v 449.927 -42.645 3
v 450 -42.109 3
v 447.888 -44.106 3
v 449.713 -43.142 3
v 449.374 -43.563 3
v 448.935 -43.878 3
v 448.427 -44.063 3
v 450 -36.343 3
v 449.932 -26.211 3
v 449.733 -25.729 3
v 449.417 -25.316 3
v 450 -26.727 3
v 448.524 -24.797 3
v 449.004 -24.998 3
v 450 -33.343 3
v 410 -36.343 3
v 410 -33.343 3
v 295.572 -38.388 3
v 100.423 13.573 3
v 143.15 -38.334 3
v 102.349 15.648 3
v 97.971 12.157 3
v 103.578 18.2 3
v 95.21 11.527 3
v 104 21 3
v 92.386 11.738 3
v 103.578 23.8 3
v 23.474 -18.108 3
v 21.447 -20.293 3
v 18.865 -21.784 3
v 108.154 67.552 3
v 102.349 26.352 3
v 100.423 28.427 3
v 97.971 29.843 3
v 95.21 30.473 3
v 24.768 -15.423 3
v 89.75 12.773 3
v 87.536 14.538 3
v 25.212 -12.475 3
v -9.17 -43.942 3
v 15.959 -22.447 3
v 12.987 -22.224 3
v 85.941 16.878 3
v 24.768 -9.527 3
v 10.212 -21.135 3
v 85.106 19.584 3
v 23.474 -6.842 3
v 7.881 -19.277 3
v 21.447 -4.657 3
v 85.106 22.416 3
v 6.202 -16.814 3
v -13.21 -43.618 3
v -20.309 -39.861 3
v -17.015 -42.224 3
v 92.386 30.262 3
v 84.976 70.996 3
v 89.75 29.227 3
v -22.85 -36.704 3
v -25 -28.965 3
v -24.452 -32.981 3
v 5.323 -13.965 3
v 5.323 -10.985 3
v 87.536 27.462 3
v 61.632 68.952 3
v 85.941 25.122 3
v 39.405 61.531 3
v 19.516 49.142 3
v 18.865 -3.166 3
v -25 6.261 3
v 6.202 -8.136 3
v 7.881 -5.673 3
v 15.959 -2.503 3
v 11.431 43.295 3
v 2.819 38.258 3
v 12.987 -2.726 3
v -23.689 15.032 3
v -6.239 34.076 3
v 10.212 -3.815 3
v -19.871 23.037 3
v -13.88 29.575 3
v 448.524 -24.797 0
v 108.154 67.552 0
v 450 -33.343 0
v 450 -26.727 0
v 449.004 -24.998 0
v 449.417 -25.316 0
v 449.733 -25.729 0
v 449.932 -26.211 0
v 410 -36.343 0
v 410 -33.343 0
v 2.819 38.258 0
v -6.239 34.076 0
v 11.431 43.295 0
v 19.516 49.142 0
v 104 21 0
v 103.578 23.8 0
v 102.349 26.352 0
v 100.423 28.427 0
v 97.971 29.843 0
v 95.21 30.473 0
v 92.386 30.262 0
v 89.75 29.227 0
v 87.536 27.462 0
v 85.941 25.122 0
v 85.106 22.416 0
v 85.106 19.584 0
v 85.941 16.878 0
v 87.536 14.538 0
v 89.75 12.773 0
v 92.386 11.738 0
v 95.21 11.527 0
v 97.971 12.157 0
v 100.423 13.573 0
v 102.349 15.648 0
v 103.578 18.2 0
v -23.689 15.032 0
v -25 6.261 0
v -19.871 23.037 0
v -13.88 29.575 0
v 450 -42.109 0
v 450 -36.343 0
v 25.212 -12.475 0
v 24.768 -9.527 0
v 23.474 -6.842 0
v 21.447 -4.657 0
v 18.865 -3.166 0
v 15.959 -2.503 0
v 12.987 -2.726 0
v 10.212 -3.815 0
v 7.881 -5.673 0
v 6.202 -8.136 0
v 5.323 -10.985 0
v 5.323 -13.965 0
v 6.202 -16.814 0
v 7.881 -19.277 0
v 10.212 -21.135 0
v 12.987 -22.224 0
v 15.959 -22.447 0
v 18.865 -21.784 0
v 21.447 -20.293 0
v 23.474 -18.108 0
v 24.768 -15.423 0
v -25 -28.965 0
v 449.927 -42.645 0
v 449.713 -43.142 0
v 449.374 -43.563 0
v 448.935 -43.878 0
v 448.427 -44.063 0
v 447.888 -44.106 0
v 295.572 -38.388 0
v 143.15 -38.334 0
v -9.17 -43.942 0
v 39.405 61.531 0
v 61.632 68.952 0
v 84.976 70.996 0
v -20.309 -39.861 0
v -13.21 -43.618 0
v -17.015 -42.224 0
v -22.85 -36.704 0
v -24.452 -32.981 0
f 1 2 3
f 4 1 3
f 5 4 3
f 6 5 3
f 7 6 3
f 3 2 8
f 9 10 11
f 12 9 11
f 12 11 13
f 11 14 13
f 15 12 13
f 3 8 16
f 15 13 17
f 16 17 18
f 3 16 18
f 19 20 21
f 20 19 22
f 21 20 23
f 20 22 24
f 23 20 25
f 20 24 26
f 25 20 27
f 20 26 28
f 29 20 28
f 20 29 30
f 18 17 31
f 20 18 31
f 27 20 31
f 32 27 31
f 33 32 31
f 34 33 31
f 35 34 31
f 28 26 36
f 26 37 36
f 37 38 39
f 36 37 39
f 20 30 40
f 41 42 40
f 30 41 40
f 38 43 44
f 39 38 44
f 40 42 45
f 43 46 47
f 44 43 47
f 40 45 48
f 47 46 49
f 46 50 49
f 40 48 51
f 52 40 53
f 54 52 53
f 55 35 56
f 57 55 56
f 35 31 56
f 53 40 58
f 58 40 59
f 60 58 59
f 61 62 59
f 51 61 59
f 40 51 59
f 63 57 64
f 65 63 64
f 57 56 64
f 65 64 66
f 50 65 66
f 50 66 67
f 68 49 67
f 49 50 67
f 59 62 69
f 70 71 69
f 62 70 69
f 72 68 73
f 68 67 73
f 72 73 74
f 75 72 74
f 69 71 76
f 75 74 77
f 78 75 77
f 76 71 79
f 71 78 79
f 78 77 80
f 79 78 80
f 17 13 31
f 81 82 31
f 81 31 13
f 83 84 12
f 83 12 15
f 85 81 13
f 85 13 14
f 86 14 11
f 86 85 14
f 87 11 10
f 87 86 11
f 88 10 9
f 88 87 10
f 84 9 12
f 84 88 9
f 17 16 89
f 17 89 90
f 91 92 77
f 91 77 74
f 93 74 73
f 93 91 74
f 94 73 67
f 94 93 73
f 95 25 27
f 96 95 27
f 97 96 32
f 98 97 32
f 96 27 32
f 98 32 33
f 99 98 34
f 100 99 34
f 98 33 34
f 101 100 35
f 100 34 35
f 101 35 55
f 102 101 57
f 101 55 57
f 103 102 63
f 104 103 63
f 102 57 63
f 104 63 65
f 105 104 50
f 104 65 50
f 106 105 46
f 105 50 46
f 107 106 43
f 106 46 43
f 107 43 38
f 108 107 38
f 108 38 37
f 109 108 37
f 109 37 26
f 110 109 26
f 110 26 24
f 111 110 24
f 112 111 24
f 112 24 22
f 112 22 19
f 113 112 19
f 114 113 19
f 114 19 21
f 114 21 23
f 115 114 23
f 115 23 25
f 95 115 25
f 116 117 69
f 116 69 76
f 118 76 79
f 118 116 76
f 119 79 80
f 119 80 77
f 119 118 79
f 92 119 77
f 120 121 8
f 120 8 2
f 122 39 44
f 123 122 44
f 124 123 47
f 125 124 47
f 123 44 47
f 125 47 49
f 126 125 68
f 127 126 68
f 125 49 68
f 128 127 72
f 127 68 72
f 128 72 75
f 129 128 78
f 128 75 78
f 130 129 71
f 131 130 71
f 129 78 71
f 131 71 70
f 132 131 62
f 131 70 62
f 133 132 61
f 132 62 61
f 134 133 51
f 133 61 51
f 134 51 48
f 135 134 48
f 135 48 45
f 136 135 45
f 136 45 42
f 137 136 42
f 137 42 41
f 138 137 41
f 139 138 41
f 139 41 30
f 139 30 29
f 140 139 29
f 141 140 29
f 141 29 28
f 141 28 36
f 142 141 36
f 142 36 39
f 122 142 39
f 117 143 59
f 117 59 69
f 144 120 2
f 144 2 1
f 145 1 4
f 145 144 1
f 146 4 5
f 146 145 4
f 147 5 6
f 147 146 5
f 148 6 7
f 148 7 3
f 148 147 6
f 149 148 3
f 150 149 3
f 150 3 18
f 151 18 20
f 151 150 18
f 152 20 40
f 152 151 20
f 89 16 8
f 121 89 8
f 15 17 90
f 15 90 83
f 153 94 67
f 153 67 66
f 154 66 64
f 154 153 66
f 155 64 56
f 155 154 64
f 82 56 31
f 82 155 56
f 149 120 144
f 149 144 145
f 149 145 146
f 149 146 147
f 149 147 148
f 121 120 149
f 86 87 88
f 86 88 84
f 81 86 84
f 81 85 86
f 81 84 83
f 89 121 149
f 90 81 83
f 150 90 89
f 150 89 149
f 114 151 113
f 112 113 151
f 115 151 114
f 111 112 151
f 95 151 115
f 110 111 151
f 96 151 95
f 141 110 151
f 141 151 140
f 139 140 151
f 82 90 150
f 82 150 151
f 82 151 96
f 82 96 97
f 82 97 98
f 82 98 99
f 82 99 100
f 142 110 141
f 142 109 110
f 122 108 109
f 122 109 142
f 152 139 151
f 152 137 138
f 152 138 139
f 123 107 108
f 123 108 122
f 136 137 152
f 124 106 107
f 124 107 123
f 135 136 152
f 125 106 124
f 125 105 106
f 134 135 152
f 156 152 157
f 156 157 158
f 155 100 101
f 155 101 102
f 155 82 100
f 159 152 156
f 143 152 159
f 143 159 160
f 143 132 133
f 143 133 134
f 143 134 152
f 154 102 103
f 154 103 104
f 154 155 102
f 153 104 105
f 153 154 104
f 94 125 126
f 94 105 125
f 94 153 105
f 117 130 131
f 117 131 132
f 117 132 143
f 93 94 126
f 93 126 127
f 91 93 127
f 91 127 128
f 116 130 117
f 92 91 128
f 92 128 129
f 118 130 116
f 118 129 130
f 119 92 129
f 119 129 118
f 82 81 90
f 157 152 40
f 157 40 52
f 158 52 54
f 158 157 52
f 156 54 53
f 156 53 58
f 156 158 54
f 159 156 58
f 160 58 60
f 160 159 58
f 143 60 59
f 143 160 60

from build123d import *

# Parameters (mm, degrees)
BOSS_EXTRUDE1_DEPTH = 3
SKETCH2_R           = 9.5
CUT_EXTRUDE2_DEPTH  = 456.583037544
SKETCH6_W           = 40
SKETCH6_H           = 3
CUT_EXTRUDE4_DEPTH  = 456.583037544
SKETCH7_R           = 10
CUT_EXTRUDE5_DEPTH  = 10


with BuildPart() as part:
    # Sketch1 → Boss-Extrude1 (new body)
    with BuildSketch(Plane.XY):
        with BuildLine():
            Line((108.154123351, 67.552328068), (448.523707095, -24.796940542))
            ThreePointArc((448.523707095, -24.796940542), (449.588617983, -25.51212784), (450, -26.727155784))
            Line((450, -26.727155784), (450, -42.109493017))
            ThreePointArc((450, -42.109493017), (449.373989907, -43.562817391), (447.887848264, -44.106346038))
            ThreePointArc((447.887848264, -44.106346038), (219.361402367, -37.652818923), (-9.169620431, -43.942183392))
            ThreePointArc((-9.169620431, -43.942183392), (-20.308838598, -39.861416221), (-25, -28.96518537))
            Line((-25, -28.96518537), (-25, 6.26137734))
            ThreePointArc((-25, 6.26137734), (-19.871474725, 23.036649171), (-6.239350333, 34.076427296))
            ThreePointArc((-6.239350333, 34.076427296), (7.186208551, 40.672066088), (19.515669553, 49.14156866))
            ThreePointArc((19.515669553, 49.14156866), (61.632192327, 68.951849742), (108.154123351, 67.552328068))
        make_face()
    extrude(amount=BOSS_EXTRUDE1_DEPTH)

    # Sketch2 → Cut-Extrude2 (cut, through all)
    with BuildSketch(Plane.XY.offset(3)):
        with Locations((94.5, 21)):
            Circle(SKETCH2_R)
    extrude(amount=-CUT_EXTRUDE2_DEPTH, mode=Mode.SUBTRACT)

    # Sketch6 → Cut-Extrude4 (cut, through all)
    with BuildSketch(Plane.XY.offset(3)):
        with Locations((430, -34.843289866)):
            Rectangle(SKETCH6_W, SKETCH6_H)
    extrude(amount=-CUT_EXTRUDE4_DEPTH, mode=Mode.SUBTRACT)

    # Sketch7 → Cut-Extrude5 (cut)
    with BuildSketch(Plane.XY.offset(3)):
        with Locations((15.211776531, -12.474975597)):
            Circle(SKETCH7_R)
    extrude(amount=-CUT_EXTRUDE5_DEPTH, mode=Mode.SUBTRACT)


solid = part.part
